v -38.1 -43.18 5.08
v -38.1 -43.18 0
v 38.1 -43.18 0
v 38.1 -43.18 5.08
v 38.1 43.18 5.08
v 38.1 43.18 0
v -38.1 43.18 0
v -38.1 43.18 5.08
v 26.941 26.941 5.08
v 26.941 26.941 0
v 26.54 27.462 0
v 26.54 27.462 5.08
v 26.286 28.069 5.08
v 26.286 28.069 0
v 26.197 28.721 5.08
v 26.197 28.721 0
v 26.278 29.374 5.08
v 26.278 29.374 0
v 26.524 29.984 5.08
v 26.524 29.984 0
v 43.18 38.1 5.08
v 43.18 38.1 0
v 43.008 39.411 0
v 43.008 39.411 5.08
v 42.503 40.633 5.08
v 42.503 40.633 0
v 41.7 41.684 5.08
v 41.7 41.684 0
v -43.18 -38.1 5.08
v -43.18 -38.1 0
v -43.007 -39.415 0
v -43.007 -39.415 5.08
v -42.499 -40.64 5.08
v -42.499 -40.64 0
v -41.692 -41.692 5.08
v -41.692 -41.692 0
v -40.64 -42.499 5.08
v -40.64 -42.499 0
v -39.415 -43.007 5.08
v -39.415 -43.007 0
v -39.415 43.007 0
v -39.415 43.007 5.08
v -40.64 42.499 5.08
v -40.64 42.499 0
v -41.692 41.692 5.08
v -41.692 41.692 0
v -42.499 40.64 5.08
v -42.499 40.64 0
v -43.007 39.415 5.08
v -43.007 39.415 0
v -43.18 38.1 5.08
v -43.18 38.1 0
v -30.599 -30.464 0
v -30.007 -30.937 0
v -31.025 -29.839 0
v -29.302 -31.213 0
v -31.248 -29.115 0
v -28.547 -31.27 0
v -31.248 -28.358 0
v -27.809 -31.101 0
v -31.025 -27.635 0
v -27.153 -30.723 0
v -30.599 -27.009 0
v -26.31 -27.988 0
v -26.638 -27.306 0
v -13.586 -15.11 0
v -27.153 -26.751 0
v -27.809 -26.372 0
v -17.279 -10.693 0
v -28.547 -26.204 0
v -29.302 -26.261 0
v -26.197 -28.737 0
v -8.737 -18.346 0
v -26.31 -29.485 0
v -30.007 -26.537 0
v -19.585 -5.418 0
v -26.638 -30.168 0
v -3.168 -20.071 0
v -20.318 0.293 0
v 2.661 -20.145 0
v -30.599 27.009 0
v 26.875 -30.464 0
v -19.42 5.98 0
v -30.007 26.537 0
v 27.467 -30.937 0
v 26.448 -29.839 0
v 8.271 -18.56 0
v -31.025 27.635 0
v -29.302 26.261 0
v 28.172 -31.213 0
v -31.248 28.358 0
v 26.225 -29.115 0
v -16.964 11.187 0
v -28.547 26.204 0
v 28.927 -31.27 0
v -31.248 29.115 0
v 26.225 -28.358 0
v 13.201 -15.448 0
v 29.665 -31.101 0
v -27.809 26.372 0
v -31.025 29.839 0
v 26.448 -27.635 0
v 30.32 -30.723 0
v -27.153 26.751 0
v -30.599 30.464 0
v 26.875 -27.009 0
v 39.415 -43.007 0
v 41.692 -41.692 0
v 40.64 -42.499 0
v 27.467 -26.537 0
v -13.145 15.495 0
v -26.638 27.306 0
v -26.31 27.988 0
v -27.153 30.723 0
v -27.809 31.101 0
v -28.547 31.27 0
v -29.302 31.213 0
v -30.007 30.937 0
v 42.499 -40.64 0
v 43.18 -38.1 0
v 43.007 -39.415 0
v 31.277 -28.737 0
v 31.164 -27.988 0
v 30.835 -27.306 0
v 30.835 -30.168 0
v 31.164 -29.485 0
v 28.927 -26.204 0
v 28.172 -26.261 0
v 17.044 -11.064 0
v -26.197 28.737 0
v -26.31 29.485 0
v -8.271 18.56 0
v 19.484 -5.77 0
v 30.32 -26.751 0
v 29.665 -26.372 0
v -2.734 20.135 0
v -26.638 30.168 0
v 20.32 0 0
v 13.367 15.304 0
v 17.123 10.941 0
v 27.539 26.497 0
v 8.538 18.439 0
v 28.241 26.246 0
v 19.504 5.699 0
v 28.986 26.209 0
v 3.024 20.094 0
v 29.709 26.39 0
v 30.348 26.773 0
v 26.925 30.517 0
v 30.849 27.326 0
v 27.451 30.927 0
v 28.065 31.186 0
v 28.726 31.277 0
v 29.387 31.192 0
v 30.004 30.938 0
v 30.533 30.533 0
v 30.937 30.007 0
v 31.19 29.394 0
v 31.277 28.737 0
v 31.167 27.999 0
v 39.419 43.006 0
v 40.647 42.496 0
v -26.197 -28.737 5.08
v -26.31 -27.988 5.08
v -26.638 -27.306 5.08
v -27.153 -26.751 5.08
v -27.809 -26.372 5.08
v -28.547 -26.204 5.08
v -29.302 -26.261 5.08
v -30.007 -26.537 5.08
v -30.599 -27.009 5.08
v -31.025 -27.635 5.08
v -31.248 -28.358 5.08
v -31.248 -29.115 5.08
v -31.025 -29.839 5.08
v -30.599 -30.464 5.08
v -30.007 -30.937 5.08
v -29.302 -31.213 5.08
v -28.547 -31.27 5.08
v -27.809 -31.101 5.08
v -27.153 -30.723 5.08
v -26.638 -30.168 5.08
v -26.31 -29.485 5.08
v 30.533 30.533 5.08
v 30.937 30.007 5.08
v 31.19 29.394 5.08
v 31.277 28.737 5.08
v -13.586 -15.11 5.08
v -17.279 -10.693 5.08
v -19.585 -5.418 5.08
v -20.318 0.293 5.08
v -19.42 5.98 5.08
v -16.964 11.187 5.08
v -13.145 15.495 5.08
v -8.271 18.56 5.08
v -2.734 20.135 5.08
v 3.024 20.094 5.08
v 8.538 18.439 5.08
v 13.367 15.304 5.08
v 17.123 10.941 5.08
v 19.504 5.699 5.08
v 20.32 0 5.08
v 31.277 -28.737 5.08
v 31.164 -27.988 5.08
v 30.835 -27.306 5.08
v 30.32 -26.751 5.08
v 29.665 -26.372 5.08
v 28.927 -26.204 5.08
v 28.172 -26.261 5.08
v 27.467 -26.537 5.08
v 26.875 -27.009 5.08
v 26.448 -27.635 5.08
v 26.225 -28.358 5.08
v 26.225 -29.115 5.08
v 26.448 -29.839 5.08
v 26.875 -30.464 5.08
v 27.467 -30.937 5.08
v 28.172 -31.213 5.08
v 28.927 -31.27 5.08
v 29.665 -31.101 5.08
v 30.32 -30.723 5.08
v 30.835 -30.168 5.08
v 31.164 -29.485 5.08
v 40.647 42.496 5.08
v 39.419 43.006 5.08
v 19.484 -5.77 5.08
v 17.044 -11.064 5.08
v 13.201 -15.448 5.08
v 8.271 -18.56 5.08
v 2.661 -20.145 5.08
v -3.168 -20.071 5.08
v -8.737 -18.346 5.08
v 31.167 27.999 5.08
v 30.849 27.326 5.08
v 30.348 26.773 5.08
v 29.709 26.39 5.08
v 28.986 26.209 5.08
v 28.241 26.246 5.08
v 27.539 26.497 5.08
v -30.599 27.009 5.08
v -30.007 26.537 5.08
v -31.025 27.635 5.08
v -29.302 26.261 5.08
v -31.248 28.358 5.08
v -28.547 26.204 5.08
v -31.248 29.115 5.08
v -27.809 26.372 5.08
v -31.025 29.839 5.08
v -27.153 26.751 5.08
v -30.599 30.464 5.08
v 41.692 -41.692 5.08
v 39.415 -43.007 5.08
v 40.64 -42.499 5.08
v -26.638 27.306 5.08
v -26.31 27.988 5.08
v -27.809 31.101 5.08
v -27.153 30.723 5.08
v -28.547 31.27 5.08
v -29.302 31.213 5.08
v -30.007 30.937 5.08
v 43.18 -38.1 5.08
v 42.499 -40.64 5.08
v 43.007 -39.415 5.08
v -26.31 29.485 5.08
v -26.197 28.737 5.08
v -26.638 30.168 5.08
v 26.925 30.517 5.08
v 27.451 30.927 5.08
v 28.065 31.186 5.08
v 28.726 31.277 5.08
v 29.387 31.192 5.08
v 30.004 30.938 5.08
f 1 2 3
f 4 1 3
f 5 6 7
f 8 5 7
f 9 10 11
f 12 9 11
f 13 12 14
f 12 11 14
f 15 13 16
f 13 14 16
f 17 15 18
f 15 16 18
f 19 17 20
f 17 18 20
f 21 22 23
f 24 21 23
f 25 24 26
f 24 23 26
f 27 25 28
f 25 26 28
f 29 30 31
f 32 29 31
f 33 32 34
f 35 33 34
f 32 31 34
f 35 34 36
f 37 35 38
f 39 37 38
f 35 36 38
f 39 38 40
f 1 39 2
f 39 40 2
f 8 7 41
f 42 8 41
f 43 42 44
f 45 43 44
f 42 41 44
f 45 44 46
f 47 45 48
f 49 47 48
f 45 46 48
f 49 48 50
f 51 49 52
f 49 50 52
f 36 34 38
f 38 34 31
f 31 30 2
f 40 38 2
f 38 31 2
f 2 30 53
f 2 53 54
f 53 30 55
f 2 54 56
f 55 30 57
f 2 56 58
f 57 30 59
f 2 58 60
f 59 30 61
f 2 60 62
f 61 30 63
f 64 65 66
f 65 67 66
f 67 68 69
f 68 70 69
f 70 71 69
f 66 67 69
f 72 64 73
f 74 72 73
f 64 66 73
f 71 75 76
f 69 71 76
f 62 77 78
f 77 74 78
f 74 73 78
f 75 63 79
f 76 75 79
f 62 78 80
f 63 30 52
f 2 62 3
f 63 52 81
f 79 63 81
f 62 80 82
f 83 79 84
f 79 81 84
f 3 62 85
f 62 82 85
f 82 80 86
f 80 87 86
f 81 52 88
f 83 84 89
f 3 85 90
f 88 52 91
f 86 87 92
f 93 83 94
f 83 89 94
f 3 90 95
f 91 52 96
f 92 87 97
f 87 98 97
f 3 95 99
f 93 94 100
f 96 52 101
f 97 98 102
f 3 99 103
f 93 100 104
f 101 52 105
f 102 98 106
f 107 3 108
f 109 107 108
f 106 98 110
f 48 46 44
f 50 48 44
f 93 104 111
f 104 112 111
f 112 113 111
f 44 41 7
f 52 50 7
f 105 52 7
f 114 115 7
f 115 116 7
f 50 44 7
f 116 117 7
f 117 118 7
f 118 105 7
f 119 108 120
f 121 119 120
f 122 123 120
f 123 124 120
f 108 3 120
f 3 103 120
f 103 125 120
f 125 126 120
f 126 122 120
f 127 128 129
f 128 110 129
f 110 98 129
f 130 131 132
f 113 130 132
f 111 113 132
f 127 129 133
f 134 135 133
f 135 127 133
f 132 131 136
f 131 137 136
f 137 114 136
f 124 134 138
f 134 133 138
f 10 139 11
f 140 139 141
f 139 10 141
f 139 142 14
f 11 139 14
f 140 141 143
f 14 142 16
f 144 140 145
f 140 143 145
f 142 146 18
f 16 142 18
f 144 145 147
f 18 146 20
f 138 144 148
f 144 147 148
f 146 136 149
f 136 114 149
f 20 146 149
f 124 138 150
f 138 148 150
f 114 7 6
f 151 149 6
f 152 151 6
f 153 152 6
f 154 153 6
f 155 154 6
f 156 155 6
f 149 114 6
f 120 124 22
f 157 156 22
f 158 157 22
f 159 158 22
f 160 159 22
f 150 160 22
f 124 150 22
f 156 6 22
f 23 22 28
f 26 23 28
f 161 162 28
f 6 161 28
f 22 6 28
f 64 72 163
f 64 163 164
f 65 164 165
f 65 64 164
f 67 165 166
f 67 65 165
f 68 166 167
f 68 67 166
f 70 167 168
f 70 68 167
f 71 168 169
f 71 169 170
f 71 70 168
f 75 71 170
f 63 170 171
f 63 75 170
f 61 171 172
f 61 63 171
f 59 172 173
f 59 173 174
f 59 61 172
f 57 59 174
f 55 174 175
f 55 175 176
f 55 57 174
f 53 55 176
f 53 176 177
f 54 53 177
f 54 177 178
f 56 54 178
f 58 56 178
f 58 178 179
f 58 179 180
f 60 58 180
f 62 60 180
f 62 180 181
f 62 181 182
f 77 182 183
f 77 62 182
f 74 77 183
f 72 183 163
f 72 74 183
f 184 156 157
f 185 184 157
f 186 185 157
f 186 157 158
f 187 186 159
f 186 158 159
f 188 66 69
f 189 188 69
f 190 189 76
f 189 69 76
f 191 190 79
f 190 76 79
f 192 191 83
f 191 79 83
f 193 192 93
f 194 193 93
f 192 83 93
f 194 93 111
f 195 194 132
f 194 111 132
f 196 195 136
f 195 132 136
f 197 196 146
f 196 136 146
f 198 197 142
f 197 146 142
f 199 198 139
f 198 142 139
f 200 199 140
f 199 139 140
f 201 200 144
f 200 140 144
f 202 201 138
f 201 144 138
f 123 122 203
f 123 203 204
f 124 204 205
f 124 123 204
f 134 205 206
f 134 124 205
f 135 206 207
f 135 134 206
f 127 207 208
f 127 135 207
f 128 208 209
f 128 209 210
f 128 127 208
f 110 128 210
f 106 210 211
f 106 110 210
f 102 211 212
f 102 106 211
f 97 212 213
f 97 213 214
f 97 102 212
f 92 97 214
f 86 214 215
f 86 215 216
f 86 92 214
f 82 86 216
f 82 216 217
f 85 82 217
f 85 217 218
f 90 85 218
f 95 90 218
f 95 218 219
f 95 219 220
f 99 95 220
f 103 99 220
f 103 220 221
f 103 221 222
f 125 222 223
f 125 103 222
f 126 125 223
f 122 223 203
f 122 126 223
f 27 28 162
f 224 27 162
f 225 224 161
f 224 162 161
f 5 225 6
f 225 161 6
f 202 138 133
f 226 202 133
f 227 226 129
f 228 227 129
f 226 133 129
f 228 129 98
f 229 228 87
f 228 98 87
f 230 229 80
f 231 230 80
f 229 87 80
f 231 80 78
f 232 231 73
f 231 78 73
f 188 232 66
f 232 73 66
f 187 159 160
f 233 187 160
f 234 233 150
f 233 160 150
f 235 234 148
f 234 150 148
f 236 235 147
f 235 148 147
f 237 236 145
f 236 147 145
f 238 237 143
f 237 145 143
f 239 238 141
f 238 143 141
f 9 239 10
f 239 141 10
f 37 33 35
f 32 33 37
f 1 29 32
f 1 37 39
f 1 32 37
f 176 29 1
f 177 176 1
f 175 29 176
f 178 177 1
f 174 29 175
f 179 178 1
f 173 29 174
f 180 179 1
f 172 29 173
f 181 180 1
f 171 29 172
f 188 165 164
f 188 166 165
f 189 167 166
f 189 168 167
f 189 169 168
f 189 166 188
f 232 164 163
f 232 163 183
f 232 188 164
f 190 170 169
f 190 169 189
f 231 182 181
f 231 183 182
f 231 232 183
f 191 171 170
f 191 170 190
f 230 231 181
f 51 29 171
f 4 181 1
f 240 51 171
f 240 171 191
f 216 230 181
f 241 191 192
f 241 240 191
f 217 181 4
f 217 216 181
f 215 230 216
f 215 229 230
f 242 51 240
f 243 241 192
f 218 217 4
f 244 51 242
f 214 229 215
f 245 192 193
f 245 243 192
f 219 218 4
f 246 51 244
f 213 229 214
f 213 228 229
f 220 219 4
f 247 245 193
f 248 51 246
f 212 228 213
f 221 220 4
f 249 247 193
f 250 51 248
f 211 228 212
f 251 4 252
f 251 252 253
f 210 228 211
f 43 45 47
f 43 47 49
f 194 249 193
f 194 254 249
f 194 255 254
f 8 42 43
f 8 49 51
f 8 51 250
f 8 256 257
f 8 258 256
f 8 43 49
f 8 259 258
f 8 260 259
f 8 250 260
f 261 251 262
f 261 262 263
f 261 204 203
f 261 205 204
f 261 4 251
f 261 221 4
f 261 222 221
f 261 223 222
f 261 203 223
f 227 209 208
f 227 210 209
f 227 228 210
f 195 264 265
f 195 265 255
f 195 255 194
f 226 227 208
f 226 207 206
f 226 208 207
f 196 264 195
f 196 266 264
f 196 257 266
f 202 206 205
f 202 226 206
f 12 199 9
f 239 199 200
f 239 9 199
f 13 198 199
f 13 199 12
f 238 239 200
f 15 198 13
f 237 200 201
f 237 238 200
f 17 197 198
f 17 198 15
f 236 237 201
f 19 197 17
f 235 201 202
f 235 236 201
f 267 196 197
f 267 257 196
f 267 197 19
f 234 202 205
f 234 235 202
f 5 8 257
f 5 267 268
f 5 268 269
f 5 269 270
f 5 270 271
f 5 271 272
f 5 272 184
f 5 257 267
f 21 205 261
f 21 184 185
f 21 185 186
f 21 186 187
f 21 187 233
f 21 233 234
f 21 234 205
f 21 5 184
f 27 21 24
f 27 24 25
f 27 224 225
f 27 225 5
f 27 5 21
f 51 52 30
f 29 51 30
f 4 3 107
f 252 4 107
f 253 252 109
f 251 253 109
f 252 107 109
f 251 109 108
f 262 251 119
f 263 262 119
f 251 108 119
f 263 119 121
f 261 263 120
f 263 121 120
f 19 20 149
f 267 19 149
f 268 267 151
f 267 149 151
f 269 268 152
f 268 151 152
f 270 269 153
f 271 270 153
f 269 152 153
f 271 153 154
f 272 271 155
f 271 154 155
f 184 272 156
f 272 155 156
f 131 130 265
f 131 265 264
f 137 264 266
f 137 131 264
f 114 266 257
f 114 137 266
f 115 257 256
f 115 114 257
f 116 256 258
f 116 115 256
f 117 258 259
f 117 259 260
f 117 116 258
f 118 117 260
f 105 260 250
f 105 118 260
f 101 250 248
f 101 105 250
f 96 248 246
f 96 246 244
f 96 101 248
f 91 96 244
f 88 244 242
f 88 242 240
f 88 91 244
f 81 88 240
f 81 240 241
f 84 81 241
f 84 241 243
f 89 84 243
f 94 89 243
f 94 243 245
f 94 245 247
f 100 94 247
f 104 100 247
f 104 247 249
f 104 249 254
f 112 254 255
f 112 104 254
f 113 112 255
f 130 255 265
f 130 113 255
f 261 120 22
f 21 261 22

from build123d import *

# Parameters (mm, degrees)
F0_R     = 2.54
F1_DEPTH = 5.08


with BuildPart() as f1:
    # F0 (on Top) → F1 (new body)
    with BuildSketch(Plane.XY):
        with BuildLine():
            ThreePointArc((-33.02, 38.1), (-34.5078975516, 41.6921024484), (-38.1, 43.18))
            ThreePointArc((-38.1, 43.18), (-41.6921024484, 41.6921024484), (-43.18, 38.1))
            ThreePointArc((-43.18, 38.1), (-38.1, 33.02), (-33.02, 38.1))
        make_face()
        with BuildLine():
            ThreePointArc((-43.18, -38.1), (-41.6921024484, -41.6921024484), (-38.1, -43.18))
            ThreePointArc((-38.1, -43.18), (-34.5078975516, -41.6921024484), (-33.02, -38.1))
            ThreePointArc((-33.02, -38.1), (-38.1, -33.02), (-43.18, -38.1))
        make_face()
        with BuildLine():
            Line((0, 43.18), (0, 38.1))
            Line((0, 38.1), (33.02, 38.1))
            ThreePointArc((33.02, 38.1), (34.5078975516, 41.6921024484), (38.1, 43.18))
            Line((38.1, 43.18), (0, 43.18))
        make_face()
        with BuildLine():
            Line((38.1, 33.02), (38.1, 0))
            Line((38.1, 0), (43.18, 0))
            Line((43.18, 0), (43.18, 38.1))
            ThreePointArc((43.18, 38.1), (41.6921024484, 34.5078975516), (38.1, 33.02))
        make_face()
        with BuildLine():
            Line((38.1, 38.1), (38.1, 33.02))
            ThreePointArc((38.1, 33.02), (41.6921024484, 34.5078975516), (43.18, 38.1))
            ThreePointArc((43.18, 38.1), (42.795516496, 40.0386915268), (41.7002658126, 41.68392049))
            Line((41.7002658126, 41.68392049), (38.1, 38.1))
        make_face()
        with BuildLine():
            ThreePointArc((38.1, 43.18), (34.5078975516, 41.6921024484), (33.02, 38.1))
            Line((33.02, 38.1), (38.1, 38.1))
            Line((38.1, 38.1), (41.7002658126, 41.68392049))
            ThreePointArc((41.7002658126, 41.68392049), (40.0493696303, 42.7910934807), (38.1, 43.18))
        make_face()
        with BuildLine():
            Line((38.1, 38.1), (33.02, 38.1))
            ThreePointArc((33.02, 38.1), (33.4066919748, 36.1559681636), (34.5078975516, 34.5078975516))
            Line((34.5078975516, 34.5078975516), (38.1, 38.1))
        make_face()
        with BuildLine():
            ThreePointArc((34.5078975516, 34.5078975516), (36.1559681636, 33.4066919748), (38.1, 33.02))
            Line((38.1, 33.02), (38.1, 38.1))
            Line((38.1, 38.1), (34.5078975516, 34.5078975516))
        make_face()
        with BuildLine():
            ThreePointArc((38.1, -43.18), (41.6921024484, -41.6921024484), (43.18, -38.1))
            ThreePointArc((43.18, -38.1), (34.5078975516, -34.5078975516), (38.1, -43.18))
        make_face()
        with BuildLine():
            Line((38.1, 0), (20.32, 0))
            ThreePointArc((20.32, 0), (8.2713308178, -18.5603740938), (-13.5862486715, -15.1101372275))
            ThreePointArc((-13.5862486715, -15.1101372275), (-18.9728804938, 7.2754522724), (0, 20.32))
            Line((0, 20.32), (0, 38.1))
            Line((0, 38.1), (0, 43.18))
            Line((0, 43.18), (-38.1, 43.18))
            ThreePointArc((-38.1, 43.18), (-34.5078975516, 41.6921024484), (-33.02, 38.1))
            ThreePointArc((-33.02, 38.1), (-38.1, 33.02), (-43.18, 38.1))
            Line((-43.18, 38.1), (-43.18, 0))
            Line((-43.18, 0), (-43.18, -38.1))
            ThreePointArc((-43.18, -38.1), (-38.1, -33.02), (-33.02, -38.1))
            ThreePointArc((-33.02, -38.1), (-34.5078975516, -41.6921024484), (-38.1, -43.18))
            Line((-38.1, -43.18), (0, -43.18))
            Line((0, -43.18), (38.1, -43.18))
            ThreePointArc((38.1, -43.18), (34.5078975516, -34.5078975516), (43.18, -38.1))
            Line((43.18, -38.1), (43.18, 0))
            Line((43.18, 0), (38.1, 0))
        make_face()
        with Locations((-28.7368195874, -28.7368195874)):
            Circle(F0_R, mode=Mode.SUBTRACT)
        with Locations((28.7368195874, -28.7368195874)):
            Circle(F0_R, mode=Mode.SUBTRACT)
        with Locations((-28.7368195874, 28.7368195874)):
            Circle(F0_R, mode=Mode.SUBTRACT)
        with BuildLine():
            ThreePointArc((14.3684097937, 14.3684097937), (18.7732321006, 7.7761273457), (20.32, 0))
            Line((20.32, 0), (38.1, 0))
            Line((38.1, 0), (38.1, 33.02))
            ThreePointArc((38.1, 33.02), (36.1559681636, 33.4066919748), (34.5078975516, 34.5078975516))
            Line((34.5078975516, 34.5078975516), (30.5328708116, 30.5328708116))
            ThreePointArc((30.5328708116, 30.5328708116), (31.0834736, 29.7088355056), (31.2768195874, 28.7368195874))
            ThreePointArc((31.2768195874, 28.7368195874), (29.7088355056, 26.3901655748), (26.9407683632, 26.9407683632))
            Line((26.9407683632, 26.9407683632), (14.3684097937, 14.3684097937))
        make_face()
        with BuildLine():
            Line((0, 38.1), (0, 20.32))
            ThreePointArc((0, 20.32), (7.7761273457, 18.7732321006), (14.3684097937, 14.3684097937))
            Line((14.3684097937, 14.3684097937), (26.9407683632, 26.9407683632))
            ThreePointArc((26.9407683632, 26.9407683632), (26.2202806744, 28.3923897696), (26.5242217024, 29.9842211264))
            ThreePointArc((26.5242217024, 29.9842211264), (28.3923897696, 31.2533585004), (30.5328708116, 30.5328708116))
            Line((30.5328708116, 30.5328708116), (34.5078975516, 34.5078975516))
            ThreePointArc((34.5078975516, 34.5078975516), (33.4066919748, 36.1559681636), (33.02, 38.1))
            Line((33.02, 38.1), (0, 38.1))
        make_face()
    extrude(amount=F1_DEPTH)


solid = f1.part
